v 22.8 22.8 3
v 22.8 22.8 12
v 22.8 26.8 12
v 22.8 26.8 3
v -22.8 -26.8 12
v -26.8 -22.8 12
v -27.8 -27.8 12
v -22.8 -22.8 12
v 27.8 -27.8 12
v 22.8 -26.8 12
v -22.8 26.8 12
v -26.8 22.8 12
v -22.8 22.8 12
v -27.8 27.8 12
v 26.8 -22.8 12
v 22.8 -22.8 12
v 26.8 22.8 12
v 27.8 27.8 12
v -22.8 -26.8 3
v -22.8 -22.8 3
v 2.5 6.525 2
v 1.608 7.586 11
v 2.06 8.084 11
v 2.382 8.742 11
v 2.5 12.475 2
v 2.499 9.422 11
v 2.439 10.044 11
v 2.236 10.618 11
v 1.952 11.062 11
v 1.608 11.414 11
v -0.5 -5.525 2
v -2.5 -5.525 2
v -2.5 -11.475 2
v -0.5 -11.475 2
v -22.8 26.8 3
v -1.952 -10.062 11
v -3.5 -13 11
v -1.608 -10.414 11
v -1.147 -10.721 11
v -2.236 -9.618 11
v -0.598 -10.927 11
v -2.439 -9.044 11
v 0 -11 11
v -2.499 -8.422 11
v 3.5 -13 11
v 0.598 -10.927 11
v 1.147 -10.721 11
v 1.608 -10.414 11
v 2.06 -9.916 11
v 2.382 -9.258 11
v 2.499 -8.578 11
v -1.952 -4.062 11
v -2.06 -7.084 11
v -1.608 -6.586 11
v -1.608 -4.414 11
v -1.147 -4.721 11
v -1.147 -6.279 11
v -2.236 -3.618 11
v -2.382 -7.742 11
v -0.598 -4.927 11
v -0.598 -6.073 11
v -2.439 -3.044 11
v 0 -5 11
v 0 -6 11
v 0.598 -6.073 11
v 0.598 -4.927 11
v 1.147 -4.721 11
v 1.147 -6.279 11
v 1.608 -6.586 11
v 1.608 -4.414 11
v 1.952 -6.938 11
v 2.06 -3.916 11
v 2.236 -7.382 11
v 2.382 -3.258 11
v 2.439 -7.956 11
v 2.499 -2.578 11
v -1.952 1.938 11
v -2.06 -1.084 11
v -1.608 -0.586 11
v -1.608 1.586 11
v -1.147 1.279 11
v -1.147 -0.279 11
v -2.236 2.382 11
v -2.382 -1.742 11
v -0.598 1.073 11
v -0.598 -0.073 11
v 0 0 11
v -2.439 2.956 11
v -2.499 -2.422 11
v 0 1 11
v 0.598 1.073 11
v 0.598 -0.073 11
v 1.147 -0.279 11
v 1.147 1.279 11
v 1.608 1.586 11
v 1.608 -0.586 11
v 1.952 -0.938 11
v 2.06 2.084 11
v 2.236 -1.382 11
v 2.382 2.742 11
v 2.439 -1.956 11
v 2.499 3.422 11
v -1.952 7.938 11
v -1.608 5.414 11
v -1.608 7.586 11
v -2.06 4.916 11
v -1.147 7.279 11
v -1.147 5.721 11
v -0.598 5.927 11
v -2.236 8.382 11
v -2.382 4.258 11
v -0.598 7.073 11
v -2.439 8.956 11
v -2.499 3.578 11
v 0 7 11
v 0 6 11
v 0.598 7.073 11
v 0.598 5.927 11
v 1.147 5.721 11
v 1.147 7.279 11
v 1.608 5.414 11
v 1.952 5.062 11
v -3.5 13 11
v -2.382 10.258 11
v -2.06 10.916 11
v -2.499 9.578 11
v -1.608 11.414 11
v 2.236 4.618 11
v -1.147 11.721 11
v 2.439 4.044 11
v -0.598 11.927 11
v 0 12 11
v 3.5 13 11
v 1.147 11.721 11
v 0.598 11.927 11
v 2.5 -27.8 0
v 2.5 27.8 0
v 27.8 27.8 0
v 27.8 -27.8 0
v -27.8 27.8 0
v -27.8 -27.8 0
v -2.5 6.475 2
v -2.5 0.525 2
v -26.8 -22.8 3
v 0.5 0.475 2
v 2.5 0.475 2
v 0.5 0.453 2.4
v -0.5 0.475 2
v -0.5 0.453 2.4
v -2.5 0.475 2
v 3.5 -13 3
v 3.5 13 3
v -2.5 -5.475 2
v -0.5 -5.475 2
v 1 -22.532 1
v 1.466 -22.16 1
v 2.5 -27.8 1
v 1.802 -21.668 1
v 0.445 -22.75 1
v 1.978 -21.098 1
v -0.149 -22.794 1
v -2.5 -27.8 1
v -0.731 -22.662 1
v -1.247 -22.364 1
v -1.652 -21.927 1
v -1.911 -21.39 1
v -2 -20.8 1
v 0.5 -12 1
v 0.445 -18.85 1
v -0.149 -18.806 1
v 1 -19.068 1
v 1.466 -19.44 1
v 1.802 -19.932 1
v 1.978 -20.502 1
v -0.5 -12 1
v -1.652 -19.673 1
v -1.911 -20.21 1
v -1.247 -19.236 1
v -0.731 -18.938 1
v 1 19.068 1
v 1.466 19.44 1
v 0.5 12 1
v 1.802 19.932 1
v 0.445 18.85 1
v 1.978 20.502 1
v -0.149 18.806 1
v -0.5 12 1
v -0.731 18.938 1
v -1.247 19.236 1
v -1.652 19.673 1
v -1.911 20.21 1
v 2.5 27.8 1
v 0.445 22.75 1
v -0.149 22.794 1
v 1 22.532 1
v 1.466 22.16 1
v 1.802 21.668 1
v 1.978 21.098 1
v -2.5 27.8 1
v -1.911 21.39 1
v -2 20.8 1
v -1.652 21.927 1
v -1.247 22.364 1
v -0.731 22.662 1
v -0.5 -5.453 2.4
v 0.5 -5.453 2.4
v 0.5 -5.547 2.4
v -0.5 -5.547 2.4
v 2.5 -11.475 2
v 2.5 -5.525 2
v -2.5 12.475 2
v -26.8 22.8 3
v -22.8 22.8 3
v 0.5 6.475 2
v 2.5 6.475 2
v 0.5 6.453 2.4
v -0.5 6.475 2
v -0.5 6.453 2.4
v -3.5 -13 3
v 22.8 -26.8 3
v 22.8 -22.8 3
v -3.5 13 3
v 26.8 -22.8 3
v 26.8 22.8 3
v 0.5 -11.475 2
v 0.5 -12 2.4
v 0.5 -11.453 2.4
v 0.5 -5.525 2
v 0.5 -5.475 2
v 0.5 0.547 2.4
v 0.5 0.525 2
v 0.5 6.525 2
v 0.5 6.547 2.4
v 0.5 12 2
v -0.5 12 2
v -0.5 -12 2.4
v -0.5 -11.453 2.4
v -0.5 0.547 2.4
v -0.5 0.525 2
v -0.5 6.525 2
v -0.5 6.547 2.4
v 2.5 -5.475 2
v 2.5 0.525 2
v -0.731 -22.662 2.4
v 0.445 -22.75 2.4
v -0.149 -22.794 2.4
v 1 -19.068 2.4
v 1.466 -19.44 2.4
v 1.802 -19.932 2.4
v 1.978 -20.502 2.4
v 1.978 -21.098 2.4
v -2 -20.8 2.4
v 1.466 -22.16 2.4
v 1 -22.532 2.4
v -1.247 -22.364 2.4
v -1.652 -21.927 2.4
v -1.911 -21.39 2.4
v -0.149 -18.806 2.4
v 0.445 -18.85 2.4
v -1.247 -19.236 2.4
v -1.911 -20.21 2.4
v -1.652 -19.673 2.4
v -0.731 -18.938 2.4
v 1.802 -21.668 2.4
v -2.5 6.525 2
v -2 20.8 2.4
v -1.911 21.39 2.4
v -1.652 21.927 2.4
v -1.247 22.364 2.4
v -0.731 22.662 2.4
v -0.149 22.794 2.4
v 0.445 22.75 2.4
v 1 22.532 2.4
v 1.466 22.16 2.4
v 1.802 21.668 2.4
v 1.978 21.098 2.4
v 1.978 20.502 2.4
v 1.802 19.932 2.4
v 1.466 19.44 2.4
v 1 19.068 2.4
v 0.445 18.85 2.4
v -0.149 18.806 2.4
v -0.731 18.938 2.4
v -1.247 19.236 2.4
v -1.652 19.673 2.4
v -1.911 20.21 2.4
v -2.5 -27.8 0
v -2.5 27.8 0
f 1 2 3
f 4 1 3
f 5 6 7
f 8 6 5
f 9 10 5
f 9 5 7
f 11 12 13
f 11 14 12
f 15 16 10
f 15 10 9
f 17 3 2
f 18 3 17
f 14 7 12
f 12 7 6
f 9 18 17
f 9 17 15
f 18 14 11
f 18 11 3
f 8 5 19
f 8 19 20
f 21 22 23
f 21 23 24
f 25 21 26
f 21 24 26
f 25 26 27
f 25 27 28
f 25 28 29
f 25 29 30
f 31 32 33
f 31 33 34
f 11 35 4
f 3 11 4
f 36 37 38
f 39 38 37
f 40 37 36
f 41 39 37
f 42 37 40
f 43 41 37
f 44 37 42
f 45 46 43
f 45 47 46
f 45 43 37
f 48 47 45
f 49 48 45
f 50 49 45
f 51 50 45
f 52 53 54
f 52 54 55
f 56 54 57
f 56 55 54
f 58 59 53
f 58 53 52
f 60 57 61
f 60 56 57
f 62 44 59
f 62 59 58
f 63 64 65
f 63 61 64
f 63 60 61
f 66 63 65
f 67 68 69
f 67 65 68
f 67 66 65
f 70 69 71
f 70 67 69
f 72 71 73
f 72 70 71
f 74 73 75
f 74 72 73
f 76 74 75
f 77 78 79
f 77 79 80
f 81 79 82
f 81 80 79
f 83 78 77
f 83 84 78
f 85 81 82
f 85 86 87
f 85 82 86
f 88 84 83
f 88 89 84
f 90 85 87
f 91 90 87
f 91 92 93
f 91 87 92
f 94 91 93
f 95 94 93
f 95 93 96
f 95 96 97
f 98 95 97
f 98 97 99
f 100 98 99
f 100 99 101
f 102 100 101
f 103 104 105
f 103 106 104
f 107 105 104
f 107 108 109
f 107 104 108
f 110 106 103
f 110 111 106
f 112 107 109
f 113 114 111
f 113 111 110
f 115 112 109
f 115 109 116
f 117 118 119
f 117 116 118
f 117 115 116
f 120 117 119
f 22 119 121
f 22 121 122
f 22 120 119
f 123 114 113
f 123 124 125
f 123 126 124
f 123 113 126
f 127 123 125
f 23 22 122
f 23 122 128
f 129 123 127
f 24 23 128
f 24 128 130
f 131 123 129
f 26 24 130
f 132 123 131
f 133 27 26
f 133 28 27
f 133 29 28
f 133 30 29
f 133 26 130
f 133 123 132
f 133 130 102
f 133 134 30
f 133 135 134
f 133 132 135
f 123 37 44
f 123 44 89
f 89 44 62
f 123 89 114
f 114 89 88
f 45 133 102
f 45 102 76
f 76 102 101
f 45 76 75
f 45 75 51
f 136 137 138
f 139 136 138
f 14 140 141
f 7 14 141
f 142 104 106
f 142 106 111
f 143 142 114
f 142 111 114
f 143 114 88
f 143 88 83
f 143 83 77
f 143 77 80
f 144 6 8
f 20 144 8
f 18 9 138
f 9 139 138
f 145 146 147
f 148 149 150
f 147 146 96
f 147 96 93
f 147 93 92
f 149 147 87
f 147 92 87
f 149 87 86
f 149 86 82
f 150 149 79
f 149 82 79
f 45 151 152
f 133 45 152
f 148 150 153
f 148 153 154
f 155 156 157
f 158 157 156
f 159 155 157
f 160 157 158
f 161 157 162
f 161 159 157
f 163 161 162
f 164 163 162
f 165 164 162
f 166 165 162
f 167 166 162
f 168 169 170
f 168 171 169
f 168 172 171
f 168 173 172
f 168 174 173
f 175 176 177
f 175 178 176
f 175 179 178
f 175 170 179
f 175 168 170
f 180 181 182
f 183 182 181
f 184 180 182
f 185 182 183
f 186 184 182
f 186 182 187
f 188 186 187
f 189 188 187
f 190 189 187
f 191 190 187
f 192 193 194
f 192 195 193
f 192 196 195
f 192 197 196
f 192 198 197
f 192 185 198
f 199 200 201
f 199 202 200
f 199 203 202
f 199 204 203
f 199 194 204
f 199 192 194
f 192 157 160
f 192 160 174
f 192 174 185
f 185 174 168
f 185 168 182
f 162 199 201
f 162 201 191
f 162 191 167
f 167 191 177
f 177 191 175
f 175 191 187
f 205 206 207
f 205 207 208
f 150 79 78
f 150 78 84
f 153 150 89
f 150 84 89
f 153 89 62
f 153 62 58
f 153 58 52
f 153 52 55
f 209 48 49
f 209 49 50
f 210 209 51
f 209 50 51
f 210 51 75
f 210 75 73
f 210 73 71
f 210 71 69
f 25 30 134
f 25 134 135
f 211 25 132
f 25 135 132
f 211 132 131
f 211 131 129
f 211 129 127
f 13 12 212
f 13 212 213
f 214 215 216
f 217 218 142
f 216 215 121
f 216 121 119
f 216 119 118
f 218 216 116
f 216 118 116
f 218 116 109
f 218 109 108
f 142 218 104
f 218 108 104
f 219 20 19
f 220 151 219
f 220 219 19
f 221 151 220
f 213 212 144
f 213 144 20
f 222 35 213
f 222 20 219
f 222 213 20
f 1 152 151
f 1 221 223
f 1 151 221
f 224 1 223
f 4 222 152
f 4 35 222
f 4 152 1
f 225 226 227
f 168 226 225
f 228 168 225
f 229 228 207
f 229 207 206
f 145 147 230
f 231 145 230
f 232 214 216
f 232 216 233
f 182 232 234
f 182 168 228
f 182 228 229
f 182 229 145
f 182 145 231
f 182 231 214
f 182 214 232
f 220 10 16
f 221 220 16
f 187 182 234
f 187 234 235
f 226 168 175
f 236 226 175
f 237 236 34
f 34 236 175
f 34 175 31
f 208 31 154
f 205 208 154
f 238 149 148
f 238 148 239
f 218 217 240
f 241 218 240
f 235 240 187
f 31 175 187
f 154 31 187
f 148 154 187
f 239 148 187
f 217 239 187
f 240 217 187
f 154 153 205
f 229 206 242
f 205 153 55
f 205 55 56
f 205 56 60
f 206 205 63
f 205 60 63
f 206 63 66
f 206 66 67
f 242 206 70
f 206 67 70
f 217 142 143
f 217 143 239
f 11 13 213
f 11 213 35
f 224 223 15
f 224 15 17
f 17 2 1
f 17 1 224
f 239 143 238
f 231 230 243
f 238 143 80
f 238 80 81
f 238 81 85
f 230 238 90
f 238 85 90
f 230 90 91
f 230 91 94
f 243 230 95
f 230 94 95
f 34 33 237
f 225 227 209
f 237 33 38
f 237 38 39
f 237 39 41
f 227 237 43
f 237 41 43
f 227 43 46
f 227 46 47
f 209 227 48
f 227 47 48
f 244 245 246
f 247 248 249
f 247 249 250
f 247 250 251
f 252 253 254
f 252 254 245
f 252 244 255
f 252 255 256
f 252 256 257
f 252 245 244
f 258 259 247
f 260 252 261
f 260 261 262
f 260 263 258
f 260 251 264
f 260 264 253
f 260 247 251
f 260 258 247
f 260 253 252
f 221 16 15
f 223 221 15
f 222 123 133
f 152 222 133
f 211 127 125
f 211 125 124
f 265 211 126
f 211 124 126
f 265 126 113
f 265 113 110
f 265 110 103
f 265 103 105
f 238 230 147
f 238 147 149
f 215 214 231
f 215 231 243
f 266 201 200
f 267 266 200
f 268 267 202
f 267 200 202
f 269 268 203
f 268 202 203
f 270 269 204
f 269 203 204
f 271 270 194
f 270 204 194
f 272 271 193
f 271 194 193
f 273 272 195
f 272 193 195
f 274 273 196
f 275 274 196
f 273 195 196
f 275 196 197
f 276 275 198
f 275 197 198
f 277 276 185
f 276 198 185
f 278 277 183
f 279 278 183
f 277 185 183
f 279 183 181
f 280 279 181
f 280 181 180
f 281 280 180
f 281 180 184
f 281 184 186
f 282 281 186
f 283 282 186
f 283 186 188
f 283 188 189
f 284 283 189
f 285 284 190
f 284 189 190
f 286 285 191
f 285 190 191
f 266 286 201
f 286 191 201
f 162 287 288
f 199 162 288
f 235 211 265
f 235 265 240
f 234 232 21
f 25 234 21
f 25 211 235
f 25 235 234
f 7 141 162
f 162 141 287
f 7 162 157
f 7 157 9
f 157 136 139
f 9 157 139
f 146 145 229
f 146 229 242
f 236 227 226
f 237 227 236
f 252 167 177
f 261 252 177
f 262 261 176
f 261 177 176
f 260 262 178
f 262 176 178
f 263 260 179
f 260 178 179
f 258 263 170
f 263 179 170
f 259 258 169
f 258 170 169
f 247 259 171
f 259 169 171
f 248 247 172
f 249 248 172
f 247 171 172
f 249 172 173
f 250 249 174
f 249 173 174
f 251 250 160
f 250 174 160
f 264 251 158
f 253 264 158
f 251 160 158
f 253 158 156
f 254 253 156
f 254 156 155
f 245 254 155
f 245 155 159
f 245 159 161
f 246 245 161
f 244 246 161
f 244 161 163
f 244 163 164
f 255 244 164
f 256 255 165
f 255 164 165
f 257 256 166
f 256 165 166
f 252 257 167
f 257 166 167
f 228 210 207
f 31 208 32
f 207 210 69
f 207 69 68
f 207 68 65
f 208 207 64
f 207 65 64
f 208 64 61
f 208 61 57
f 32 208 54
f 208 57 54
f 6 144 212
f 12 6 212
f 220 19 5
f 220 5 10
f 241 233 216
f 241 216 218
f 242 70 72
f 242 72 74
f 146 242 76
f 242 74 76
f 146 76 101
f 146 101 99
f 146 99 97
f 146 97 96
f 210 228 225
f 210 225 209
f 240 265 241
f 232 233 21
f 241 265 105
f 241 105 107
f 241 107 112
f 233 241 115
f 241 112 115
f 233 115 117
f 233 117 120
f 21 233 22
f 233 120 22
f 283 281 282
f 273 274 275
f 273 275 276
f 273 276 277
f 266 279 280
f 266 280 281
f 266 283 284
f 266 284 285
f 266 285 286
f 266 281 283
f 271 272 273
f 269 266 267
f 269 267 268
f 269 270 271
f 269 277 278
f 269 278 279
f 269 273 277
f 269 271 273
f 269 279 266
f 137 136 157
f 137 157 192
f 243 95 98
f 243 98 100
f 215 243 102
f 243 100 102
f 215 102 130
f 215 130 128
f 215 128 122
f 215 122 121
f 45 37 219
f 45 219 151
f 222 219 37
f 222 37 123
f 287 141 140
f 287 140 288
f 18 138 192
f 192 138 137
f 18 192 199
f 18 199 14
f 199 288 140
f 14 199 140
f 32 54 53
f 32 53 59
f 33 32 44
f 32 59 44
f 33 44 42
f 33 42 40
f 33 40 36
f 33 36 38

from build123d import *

# Parameters (mm, degrees)
SKICA1_W                 = 55.6
SKICA1_H                 = 55.6
P_IDAT_VYSUNUT_M1_DEPTH  = 3
SKICA2_W                 = 5
SKICA2_H                 = 55.6
ODEBRAT_VYSUNUT_M1_DEPTH = 1
SKICA3_R                 = 2
SKICA3_W                 = 1
SKICA3_H                 = 24
ODEBRAT_VYSUNUT_M2_DEPTH = 1.4
SKICA4_W                 = 7
SKICA4_H                 = 26
P_IDAT_VYSUNUT_M2_DEPTH  = 8
LINPOLE1_COUNT           = 4
LINPOLE1_PITCH           = 6
SKICA9_W                 = 54.6
SKICA9_H                 = 1
SKICA9_W_2               = 1
SKICA9_H_2               = 53.6
SKICA9_W_3               = 4
SKICA9_H_3               = 4
P_IDAT_VYSUNUT_M3_DEPTH  = 9


with BuildPart() as part:
    # Skica1 → Přidat vysunutím1 (new body)
    with BuildSketch(Plane.XY):
        Rectangle(SKICA1_W, SKICA1_H)
    extrude(amount=P_IDAT_VYSUNUT_M1_DEPTH)

    # Skica2 → Odebrat vysunutím1 (cut)
    with BuildSketch(Plane(origin=(0, 0, 0), x_dir=(-1, 0, 0), z_dir=(0, 0, -1))):
        Rectangle(SKICA2_W, SKICA2_H)
    extrude(amount=-ODEBRAT_VYSUNUT_M1_DEPTH, mode=Mode.SUBTRACT)

    # Skica3 → Odebrat vysunutím2 (cut)
    with BuildSketch(Plane(origin=(0, 0, 1), x_dir=(-1, 0, 0), z_dir=(0, 0, -1))):
        with Locations((0, 20.8)):
            Circle(SKICA3_R)
        with Locations((0, -20.8)):
            Circle(SKICA3_R)
        Rectangle(SKICA3_W, SKICA3_H)
    extrude(amount=-ODEBRAT_VYSUNUT_M2_DEPTH, mode=Mode.SUBTRACT)

    # Skica4 → Přidat vysunutím2 (add)
    with BuildSketch(Plane.XY.offset(3)):
        Rectangle(SKICA4_W, SKICA4_H)
    extrude(amount=P_IDAT_VYSUNUT_M2_DEPTH)

    # Odebrat spojením profilů2: read off the stored shape, not the designer's step
    # Odebrat spojením profilů2: loft between two sections, ruled curve by curve
    odebrat_spojen_m_profil_2_from = [
        Edge.make_bspline([(-2.5, 6.525099132, 2), (-2.083333333, 6.525099132, 2), (-1.666666667, 6.525099132, 2), (-0.833333333, 6.525099132, 2), (-0.416666667, 6.525099132, 2), (0.416666667, 6.525099132, 2), (0.833333333, 6.525099132, 2), (1.666666667, 6.525099132, 2), (2.083333333, 6.525099132, 2), (2.5, 6.525099132, 2)], [0, 0, 0, 0, 0.25, 0.25, 0.5, 0.5, 0.75, 0.75, 1, 1, 1, 1], 3),
        Edge.make_bspline([(-2.5, 12.474900868, 2), (-2.5, 11.979084057, 2), (-2.5, 11.483267245, 2), (-2.5, 10.491633623, 2), (-2.5, 9.995816811, 2), (-2.5, 9.004183189, 2), (-2.5, 8.508366377, 2), (-2.5, 7.516732755, 2), (-2.5, 7.020915943, 2), (-2.5, 6.525099132, 2)], [0, 0, 0, 0, 0.25, 0.25, 0.5, 0.5, 0.75, 0.75, 1, 1, 1, 1], 3),
        Edge.make_bspline([(2.5, 12.474900868, 2), (2.083333333, 12.474900868, 2), (1.666666667, 12.474900868, 2), (0.833333333, 12.474900868, 2), (0.416666667, 12.474900868, 2), (-0.416666667, 12.474900868, 2), (-0.833333333, 12.474900868, 2), (-1.666666667, 12.474900868, 2), (-2.083333333, 12.474900868, 2), (-2.5, 12.474900868, 2)], [0, 0, 0, 0, 0.25, 0.25, 0.5, 0.5, 0.75, 0.75, 1, 1, 1, 1], 3),
        Edge.make_bspline([(2.5, 6.525099132, 2), (2.5, 7.020915943, 2), (2.5, 7.516732755, 2), (2.5, 8.508366377, 2), (2.5, 9.004183189, 2), (2.5, 9.995816811, 2), (2.5, 10.491633623, 2), (2.5, 11.483267245, 2), (2.5, 11.979084057, 2), (2.5, 12.474900868, 2)], [0, 0, 0, 0, 0.25, 0.25, 0.5, 0.5, 0.75, 0.75, 1, 1, 1, 1], 3),
    ]
    odebrat_spojen_m_profil_2_to = [
        Edge.make_bspline([(-1.608388791, 7.586081116, 11), (-1.403167079, 7.413620149, 11), (-1.156724267, 7.264297071, 11), (-0.606690103, 7.056988388, 11), (-0.303658501, 7, 11), (0.303658501, 7, 11), (0.606690103, 7.056988388, 11), (1.156724267, 7.264297071, 11), (1.403167079, 7.413620149, 11), (1.608388791, 7.586081116, 11)], [0, 0, 0, 0, 0.25, 0.25, 0.5, 0.5, 0.75, 0.75, 1, 1, 1, 1], 3),
        Edge.make_bspline([(-1.608388791, 11.413918884, 11), (-1.852594491, 11.208697172, 11), (-2.079966955, 10.935038102, 11), (-2.405399483, 10.274370851, 11), (-2.5, 9.8882136, 11), (-2.5, 9.1117864, 11), (-2.405399483, 8.725629149, 11), (-2.079966955, 8.064961898, 11), (-1.852594491, 7.791302828, 11), (-1.608388791, 7.586081116, 11)], [0, 0, 0, 0, 0.25, 0.25, 0.5, 0.5, 0.75, 0.75, 1, 1, 1, 1], 3),
        Edge.make_bspline([(1.608388791, 11.413918884, 11), (1.403167079, 11.586379851, 11), (1.156724267, 11.735702929, 11), (0.606690103, 11.943011612, 11), (0.303658501, 12, 11), (-0.303658501, 12, 11), (-0.606690103, 11.943011612, 11), (-1.156724267, 11.735702929, 11), (-1.403167079, 11.586379851, 11), (-1.608388791, 11.413918884, 11)], [0, 0, 0, 0, 0.25, 0.25, 0.5, 0.5, 0.75, 0.75, 1, 1, 1, 1], 3),
        Edge.make_bspline([(1.608388791, 7.586081116, 11), (1.852594491, 7.791302828, 11), (2.079966955, 8.064961898, 11), (2.405399483, 8.725629149, 11), (2.5, 9.1117864, 11), (2.5, 9.8882136, 11), (2.405399483, 10.274370851, 11), (2.079966955, 10.935038102, 11), (1.852594491, 11.208697172, 11), (1.608388791, 11.413918884, 11)], [0, 0, 0, 0, 0.25, 0.25, 0.5, 0.5, 0.75, 0.75, 1, 1, 1, 1], 3),
    ]
    odebrat_spojen_m_profil_2 = Solid(Shell([*[Face.make_surface_from_curves(odebrat_spojen_m_profil_2_from[k], odebrat_spojen_m_profil_2_to[k]) for k in range(4)], Face(Wire(odebrat_spojen_m_profil_2_from)), Face(Wire(odebrat_spojen_m_profil_2_to))]))
    add(odebrat_spojen_m_profil_2, mode=Mode.SUBTRACT)

    # LinPole1: Odebrat spojením profilů2 ×4
    with Locations(*[(0, -i * LINPOLE1_PITCH, 0) for i in range(1, LINPOLE1_COUNT)]):
        add(odebrat_spojen_m_profil_2, mode=Mode.SUBTRACT)

    # Skica9 → Přidat vysunutím3 (add)
    with BuildSketch(Plane.XY.offset(3)):
        Polygon((-26.8, 22.8), (-26.8, 26.8), (-26.8, 27.8), (-27.8, 27.8), (-27.8, -27.8), (-26.8, -27.8), (-26.8, -26.8), (-26.8, -22.8), align=None)
        Polygon((22.8, 26.8), (26.8, 26.8), (27.8, 26.8), (27.8, 27.8), (-26.8, 27.8), (-26.8, 26.8), (-22.8, 26.8), align=None)
        with Locations((0.5, -27.3)):
            Rectangle(SKICA9_W, SKICA9_H)
        with Locations((27.3, 0)):
            Rectangle(SKICA9_W_2, SKICA9_H_2)
        with Locations((-24.8, 24.8)):
            Rectangle(SKICA9_W_3, SKICA9_H_3)
        with Locations((24.8, 24.8)):
            Rectangle(SKICA9_W_3, SKICA9_H_3)
        with Locations((24.8, -24.8)):
            Rectangle(SKICA9_W_3, SKICA9_H_3)
        with Locations((-24.8, -24.8)):
            Rectangle(SKICA9_W_3, SKICA9_H_3)
    extrude(amount=P_IDAT_VYSUNUT_M3_DEPTH)


solid = part.part
